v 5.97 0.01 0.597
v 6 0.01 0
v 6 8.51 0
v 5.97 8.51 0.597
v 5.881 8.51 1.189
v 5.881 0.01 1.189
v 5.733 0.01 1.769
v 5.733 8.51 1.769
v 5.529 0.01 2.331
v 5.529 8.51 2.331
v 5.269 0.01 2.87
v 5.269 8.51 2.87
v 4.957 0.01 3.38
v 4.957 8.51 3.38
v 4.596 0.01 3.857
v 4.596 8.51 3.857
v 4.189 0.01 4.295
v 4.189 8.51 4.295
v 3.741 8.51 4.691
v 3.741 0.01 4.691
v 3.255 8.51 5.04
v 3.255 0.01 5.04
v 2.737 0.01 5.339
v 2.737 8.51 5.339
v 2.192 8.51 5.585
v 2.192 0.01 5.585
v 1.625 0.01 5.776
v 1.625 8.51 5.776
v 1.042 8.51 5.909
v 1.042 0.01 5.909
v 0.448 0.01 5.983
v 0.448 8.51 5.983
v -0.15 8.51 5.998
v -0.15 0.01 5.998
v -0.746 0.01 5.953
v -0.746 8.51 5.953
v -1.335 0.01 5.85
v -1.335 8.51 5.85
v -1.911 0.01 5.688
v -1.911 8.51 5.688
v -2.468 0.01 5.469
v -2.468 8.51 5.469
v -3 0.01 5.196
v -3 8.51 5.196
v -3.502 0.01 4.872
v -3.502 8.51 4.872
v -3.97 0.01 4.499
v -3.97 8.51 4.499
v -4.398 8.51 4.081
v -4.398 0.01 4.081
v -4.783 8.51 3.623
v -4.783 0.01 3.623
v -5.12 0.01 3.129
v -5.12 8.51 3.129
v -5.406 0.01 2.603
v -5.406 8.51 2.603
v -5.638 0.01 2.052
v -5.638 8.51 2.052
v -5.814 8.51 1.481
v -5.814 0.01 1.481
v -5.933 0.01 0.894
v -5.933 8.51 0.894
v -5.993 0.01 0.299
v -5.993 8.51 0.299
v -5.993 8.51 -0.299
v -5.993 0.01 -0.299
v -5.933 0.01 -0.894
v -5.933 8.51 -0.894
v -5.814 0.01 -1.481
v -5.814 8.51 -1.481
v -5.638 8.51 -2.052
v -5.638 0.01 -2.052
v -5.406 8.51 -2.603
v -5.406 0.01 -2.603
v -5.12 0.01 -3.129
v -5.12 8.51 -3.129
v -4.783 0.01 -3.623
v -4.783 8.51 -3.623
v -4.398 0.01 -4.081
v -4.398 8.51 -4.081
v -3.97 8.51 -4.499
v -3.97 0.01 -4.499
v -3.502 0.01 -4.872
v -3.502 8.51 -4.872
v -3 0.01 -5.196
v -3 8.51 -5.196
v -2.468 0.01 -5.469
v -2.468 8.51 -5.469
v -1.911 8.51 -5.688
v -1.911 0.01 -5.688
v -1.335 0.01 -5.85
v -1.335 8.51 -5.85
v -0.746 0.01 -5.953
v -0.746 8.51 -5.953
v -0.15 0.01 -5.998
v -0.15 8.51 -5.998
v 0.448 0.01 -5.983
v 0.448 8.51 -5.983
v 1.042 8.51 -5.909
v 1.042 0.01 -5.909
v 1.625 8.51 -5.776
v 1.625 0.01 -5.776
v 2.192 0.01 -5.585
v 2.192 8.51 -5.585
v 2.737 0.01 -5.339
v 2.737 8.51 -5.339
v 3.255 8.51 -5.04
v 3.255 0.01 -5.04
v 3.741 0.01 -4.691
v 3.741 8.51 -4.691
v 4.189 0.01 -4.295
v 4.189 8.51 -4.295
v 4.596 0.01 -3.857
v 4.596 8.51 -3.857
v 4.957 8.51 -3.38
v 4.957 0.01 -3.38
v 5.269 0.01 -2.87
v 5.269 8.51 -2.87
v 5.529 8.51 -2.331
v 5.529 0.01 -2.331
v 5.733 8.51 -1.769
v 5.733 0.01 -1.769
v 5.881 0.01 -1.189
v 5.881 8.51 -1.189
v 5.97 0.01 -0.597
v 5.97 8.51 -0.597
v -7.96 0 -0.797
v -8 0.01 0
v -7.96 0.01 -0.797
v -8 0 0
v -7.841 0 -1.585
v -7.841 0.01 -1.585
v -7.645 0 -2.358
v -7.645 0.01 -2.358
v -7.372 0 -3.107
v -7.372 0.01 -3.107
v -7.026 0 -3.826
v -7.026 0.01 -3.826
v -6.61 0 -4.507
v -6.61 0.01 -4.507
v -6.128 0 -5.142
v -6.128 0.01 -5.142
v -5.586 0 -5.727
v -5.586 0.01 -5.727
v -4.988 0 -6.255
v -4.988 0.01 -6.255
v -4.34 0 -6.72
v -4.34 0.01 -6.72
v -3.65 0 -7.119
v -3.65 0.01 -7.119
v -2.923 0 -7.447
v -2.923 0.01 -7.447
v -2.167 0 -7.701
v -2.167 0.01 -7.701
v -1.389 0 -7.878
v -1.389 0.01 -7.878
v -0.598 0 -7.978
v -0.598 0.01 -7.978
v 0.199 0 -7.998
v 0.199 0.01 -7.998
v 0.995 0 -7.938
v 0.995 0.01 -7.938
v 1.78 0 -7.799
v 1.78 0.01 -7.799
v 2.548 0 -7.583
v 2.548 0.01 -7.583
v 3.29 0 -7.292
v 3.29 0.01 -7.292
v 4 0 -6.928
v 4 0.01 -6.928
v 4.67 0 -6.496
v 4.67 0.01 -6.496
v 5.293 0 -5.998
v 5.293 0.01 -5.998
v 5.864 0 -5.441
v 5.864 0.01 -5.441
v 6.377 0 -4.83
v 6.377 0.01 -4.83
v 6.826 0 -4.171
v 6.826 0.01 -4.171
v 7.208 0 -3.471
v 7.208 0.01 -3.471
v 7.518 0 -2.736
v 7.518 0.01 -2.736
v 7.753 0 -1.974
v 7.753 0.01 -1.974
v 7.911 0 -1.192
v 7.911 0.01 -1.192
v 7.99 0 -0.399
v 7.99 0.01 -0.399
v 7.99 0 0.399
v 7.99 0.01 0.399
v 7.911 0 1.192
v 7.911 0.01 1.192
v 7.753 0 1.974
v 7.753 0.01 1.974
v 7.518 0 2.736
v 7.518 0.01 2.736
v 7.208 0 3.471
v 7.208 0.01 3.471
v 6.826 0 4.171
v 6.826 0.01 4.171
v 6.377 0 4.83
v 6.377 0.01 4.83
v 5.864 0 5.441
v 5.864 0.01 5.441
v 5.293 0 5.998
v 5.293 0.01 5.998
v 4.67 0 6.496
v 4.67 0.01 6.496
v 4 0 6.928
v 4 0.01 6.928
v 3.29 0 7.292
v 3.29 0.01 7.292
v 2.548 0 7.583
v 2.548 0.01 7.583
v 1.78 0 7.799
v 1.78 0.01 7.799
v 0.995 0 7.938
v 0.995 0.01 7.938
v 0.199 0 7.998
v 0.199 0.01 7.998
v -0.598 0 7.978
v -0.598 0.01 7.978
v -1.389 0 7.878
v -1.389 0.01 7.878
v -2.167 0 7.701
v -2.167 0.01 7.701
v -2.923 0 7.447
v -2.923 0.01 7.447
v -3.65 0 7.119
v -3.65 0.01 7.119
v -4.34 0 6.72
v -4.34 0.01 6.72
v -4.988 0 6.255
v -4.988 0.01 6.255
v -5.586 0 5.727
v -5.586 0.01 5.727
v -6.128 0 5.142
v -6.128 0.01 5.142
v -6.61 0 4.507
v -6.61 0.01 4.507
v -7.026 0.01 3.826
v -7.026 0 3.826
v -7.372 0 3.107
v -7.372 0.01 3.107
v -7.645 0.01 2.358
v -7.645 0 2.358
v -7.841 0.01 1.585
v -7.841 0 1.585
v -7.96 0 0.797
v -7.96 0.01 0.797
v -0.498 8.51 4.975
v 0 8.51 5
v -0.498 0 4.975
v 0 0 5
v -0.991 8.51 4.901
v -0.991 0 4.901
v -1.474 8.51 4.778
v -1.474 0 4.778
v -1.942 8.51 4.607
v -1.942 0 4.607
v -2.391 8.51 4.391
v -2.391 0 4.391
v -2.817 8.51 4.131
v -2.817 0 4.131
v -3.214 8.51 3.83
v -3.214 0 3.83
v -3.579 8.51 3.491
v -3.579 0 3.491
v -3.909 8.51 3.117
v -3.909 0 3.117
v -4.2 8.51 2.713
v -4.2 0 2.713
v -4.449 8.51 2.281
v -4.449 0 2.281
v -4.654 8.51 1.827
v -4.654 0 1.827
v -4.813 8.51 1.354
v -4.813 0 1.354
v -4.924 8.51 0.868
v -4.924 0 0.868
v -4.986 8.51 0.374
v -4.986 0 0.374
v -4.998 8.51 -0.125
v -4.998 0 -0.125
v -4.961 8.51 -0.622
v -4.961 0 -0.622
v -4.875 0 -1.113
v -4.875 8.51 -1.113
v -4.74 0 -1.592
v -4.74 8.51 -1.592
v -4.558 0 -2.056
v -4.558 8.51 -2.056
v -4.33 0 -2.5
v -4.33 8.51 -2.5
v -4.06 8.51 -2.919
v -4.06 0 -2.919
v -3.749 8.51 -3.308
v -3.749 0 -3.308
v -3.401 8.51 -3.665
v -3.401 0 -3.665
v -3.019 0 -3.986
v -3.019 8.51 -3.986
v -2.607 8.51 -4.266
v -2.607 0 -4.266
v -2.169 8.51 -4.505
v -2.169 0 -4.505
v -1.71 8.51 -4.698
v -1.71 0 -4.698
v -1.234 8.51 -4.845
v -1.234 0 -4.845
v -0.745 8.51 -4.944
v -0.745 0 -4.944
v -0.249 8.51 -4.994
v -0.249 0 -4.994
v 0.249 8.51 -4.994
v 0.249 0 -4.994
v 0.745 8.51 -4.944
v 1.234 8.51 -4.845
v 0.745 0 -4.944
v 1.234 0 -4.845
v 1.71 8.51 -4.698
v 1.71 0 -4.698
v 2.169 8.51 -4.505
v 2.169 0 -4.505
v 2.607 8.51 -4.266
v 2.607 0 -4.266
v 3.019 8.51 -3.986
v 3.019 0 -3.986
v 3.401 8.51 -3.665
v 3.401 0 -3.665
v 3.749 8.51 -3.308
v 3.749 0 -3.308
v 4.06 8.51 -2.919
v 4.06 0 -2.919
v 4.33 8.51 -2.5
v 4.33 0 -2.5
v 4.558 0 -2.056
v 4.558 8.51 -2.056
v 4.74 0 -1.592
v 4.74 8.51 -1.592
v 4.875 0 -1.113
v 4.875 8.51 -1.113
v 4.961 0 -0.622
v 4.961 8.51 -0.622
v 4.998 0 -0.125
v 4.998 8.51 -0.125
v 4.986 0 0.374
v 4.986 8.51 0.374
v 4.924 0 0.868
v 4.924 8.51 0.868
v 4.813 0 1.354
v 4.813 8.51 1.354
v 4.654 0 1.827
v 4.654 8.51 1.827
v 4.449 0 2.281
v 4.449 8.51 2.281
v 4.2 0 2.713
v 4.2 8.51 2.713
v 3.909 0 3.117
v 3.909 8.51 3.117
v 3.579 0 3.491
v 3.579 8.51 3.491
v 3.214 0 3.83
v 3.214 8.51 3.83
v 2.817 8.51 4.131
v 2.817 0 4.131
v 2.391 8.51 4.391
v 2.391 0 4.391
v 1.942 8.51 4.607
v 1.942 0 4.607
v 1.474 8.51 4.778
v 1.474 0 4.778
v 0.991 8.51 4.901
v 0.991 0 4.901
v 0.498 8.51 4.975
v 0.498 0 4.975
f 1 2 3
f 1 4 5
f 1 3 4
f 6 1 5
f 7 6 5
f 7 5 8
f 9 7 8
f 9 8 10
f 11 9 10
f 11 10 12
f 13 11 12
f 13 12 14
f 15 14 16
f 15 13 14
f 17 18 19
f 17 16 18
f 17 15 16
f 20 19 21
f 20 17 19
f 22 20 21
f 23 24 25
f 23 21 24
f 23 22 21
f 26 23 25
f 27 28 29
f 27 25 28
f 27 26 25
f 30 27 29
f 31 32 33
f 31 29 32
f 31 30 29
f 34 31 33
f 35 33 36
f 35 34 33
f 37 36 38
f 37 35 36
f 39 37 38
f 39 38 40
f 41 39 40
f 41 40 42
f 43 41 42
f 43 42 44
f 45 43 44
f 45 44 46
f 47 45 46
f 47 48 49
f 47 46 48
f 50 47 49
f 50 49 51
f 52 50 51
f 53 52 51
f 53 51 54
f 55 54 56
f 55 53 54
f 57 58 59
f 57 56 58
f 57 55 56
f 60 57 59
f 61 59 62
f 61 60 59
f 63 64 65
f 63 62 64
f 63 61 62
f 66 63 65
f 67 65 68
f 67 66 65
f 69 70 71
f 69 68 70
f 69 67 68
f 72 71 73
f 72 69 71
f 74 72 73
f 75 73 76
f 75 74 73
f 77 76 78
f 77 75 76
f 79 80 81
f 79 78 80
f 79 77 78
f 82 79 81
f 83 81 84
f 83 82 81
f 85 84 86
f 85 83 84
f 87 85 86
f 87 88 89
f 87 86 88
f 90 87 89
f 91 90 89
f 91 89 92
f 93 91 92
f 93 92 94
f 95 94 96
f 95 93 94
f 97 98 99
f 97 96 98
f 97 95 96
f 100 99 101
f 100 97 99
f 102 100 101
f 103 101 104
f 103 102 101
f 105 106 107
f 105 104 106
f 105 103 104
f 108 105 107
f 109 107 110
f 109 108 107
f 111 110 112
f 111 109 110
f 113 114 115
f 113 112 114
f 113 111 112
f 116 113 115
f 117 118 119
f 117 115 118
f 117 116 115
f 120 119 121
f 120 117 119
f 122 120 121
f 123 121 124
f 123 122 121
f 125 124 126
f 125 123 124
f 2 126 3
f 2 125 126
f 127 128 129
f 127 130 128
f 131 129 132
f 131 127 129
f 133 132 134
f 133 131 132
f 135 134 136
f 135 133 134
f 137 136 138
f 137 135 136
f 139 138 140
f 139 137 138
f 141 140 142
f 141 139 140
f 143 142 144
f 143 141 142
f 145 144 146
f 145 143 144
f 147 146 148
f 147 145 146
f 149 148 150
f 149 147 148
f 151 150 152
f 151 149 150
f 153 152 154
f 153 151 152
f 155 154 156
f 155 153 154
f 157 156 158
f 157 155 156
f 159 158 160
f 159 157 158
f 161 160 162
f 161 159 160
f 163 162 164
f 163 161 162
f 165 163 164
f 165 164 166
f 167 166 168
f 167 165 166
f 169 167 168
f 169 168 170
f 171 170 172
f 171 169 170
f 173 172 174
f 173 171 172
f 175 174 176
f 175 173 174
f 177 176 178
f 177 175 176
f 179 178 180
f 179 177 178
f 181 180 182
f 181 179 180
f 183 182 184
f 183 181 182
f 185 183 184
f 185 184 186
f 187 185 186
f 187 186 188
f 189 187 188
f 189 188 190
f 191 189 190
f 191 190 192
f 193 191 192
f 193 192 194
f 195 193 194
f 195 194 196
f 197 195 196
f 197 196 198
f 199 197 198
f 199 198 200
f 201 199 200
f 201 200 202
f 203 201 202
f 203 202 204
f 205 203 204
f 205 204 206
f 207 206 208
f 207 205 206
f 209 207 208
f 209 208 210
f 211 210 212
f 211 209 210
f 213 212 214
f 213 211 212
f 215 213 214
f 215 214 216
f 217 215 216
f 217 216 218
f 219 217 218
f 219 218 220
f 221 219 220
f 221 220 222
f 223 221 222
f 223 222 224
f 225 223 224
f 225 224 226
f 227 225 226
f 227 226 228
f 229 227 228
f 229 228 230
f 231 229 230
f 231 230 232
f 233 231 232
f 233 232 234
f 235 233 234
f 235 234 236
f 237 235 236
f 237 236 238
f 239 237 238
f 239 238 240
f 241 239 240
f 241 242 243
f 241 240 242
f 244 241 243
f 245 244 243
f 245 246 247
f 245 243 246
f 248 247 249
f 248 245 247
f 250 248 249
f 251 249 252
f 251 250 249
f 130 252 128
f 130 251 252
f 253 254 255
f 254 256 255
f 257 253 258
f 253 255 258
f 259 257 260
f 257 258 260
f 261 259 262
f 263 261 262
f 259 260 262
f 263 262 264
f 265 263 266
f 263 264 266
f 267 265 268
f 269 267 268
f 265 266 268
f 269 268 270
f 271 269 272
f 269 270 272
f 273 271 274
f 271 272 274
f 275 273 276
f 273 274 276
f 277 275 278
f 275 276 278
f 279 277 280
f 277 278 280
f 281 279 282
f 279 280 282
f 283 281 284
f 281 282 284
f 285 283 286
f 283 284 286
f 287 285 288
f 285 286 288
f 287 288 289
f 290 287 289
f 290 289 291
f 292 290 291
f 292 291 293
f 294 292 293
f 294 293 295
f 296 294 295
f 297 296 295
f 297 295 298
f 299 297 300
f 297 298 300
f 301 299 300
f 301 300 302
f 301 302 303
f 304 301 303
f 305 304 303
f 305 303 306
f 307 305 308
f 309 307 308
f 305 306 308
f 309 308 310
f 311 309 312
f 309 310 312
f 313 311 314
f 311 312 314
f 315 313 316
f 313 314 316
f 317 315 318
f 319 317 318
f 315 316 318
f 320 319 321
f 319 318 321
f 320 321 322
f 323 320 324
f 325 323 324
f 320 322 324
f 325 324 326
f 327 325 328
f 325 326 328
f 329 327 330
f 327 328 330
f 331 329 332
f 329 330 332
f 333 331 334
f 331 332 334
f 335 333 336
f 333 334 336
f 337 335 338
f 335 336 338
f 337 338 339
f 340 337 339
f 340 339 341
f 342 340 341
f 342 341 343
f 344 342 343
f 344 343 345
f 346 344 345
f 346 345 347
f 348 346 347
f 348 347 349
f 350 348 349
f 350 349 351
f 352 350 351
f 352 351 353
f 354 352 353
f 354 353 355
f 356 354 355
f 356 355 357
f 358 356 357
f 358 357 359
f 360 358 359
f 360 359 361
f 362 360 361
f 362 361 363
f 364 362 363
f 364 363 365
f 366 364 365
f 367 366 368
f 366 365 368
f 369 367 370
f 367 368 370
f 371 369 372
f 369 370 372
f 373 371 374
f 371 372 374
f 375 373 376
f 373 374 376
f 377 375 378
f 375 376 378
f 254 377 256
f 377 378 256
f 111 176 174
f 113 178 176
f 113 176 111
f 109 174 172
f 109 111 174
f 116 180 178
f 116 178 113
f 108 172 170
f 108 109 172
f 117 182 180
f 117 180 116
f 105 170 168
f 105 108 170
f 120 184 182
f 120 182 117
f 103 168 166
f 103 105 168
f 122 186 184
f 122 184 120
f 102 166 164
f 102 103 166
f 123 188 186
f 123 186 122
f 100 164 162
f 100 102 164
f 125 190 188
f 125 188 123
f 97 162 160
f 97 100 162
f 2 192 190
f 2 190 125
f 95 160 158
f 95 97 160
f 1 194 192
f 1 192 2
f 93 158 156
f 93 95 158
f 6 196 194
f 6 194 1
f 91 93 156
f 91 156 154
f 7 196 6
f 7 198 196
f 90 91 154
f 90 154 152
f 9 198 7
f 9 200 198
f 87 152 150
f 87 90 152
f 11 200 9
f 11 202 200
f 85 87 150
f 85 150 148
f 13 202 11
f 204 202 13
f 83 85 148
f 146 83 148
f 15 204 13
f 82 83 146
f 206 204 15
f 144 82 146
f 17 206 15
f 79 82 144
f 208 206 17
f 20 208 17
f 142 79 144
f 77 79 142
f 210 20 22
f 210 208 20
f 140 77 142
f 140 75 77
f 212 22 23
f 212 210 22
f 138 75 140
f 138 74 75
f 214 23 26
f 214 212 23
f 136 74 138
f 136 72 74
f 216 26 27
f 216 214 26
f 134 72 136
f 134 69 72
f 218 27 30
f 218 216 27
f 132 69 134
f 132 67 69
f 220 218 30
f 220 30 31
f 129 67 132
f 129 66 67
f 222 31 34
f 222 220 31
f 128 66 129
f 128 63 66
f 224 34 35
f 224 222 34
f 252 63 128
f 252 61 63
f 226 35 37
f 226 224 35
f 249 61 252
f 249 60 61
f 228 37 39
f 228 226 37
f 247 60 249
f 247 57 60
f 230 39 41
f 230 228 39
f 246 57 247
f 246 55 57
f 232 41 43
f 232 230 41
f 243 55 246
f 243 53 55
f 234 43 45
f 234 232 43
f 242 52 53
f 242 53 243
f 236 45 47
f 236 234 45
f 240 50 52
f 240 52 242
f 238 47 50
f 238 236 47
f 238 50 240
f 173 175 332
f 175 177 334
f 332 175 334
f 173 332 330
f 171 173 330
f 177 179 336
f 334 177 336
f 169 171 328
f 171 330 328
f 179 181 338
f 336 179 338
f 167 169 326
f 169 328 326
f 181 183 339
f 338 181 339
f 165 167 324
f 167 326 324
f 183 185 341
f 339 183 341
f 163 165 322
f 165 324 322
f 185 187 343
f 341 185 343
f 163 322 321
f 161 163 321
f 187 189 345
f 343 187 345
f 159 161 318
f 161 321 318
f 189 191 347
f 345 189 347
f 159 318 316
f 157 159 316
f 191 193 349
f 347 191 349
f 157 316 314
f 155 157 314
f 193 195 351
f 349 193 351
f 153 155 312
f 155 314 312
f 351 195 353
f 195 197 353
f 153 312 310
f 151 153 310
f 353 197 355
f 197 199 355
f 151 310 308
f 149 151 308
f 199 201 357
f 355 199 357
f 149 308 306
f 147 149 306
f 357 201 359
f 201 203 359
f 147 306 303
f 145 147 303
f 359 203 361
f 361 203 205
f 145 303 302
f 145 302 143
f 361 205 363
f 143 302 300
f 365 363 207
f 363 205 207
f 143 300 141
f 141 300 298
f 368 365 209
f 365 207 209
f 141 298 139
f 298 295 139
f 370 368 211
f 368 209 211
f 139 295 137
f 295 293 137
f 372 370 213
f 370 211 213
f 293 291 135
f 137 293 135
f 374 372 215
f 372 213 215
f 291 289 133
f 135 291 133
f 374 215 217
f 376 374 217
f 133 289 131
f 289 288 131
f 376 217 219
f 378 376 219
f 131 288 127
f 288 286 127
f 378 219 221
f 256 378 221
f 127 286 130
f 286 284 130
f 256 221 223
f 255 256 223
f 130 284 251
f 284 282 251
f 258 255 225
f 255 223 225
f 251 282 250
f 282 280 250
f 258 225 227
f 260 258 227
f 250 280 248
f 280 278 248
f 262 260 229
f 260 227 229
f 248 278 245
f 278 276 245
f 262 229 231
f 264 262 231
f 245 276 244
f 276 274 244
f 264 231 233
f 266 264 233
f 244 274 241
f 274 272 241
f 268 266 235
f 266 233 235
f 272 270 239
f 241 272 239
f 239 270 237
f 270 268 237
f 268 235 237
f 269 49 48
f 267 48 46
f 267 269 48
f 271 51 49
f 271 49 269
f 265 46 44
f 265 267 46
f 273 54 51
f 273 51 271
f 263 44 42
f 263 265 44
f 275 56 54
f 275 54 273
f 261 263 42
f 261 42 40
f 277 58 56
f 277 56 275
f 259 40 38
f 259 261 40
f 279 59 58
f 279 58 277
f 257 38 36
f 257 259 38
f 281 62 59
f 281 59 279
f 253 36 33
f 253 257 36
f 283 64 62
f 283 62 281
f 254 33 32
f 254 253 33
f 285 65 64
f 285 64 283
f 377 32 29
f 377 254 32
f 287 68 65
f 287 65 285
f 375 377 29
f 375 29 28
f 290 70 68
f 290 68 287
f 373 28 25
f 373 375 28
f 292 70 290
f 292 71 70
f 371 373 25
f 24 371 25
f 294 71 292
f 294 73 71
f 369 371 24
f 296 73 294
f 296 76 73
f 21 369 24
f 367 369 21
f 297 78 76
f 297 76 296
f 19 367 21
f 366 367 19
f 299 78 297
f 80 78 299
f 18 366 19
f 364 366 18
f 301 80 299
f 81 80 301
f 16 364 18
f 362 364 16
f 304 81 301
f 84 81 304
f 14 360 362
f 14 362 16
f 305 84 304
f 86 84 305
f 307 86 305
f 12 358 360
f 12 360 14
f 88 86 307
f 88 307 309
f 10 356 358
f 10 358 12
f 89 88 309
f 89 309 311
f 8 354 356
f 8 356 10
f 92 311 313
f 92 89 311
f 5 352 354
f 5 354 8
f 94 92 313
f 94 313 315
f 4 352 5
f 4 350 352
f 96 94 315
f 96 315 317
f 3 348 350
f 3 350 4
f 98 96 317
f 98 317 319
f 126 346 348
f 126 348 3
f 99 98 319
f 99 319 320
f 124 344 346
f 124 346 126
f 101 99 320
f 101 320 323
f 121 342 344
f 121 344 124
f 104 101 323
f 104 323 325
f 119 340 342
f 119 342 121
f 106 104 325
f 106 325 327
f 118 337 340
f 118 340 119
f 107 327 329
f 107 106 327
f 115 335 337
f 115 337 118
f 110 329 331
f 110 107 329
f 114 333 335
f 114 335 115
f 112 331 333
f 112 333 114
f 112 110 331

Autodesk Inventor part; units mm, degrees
ref_plane "YZ Plane" through (0, 0, 0) normal (1, 0, 0) x (0, 1, 0)
ref_plane "XZ Plane" through (0, 0, 0) normal (0, 1, 0) x (-1, 0, 0)
ref_plane "XY Plane" through (0, 0, 0) normal (0, 0, 1) x (1, 0, 0)
sketch "Sketch1" plane through (0, 0, 0) normal (0, 1, 0) x (-1, 0, 0)
  circle A0 centre (0, 0) radius 8
  dimension "d0" = 16
extrude "Extrusion1" add sketch "Sketch1" along normal blind 0.01
sketch "Sketch2" plane through (0, 0.01, 0) normal (0, 1, 0) x (1, 0, 0)
  circle A0 centre (0, 0) radius 6
  dimension "d3" = 12
extrude "Extrusion2" add sketch "Sketch2" along normal blind 8.5
sketch "Sketch3" plane through (0, 8.51, 0) normal (0, 1, 0) x (1, 0, 0)
  circle A0 centre (0, 0) radius 6 projected
  line L0 (0, -6) -> (0, 6)
  line L1 (-6, 0) -> (6, 0)
hole "Hole1" at (0, 8.51, 0) direction (0, -1, 0) diameter 10 end through all
properties part number "Drukhulse ff"
